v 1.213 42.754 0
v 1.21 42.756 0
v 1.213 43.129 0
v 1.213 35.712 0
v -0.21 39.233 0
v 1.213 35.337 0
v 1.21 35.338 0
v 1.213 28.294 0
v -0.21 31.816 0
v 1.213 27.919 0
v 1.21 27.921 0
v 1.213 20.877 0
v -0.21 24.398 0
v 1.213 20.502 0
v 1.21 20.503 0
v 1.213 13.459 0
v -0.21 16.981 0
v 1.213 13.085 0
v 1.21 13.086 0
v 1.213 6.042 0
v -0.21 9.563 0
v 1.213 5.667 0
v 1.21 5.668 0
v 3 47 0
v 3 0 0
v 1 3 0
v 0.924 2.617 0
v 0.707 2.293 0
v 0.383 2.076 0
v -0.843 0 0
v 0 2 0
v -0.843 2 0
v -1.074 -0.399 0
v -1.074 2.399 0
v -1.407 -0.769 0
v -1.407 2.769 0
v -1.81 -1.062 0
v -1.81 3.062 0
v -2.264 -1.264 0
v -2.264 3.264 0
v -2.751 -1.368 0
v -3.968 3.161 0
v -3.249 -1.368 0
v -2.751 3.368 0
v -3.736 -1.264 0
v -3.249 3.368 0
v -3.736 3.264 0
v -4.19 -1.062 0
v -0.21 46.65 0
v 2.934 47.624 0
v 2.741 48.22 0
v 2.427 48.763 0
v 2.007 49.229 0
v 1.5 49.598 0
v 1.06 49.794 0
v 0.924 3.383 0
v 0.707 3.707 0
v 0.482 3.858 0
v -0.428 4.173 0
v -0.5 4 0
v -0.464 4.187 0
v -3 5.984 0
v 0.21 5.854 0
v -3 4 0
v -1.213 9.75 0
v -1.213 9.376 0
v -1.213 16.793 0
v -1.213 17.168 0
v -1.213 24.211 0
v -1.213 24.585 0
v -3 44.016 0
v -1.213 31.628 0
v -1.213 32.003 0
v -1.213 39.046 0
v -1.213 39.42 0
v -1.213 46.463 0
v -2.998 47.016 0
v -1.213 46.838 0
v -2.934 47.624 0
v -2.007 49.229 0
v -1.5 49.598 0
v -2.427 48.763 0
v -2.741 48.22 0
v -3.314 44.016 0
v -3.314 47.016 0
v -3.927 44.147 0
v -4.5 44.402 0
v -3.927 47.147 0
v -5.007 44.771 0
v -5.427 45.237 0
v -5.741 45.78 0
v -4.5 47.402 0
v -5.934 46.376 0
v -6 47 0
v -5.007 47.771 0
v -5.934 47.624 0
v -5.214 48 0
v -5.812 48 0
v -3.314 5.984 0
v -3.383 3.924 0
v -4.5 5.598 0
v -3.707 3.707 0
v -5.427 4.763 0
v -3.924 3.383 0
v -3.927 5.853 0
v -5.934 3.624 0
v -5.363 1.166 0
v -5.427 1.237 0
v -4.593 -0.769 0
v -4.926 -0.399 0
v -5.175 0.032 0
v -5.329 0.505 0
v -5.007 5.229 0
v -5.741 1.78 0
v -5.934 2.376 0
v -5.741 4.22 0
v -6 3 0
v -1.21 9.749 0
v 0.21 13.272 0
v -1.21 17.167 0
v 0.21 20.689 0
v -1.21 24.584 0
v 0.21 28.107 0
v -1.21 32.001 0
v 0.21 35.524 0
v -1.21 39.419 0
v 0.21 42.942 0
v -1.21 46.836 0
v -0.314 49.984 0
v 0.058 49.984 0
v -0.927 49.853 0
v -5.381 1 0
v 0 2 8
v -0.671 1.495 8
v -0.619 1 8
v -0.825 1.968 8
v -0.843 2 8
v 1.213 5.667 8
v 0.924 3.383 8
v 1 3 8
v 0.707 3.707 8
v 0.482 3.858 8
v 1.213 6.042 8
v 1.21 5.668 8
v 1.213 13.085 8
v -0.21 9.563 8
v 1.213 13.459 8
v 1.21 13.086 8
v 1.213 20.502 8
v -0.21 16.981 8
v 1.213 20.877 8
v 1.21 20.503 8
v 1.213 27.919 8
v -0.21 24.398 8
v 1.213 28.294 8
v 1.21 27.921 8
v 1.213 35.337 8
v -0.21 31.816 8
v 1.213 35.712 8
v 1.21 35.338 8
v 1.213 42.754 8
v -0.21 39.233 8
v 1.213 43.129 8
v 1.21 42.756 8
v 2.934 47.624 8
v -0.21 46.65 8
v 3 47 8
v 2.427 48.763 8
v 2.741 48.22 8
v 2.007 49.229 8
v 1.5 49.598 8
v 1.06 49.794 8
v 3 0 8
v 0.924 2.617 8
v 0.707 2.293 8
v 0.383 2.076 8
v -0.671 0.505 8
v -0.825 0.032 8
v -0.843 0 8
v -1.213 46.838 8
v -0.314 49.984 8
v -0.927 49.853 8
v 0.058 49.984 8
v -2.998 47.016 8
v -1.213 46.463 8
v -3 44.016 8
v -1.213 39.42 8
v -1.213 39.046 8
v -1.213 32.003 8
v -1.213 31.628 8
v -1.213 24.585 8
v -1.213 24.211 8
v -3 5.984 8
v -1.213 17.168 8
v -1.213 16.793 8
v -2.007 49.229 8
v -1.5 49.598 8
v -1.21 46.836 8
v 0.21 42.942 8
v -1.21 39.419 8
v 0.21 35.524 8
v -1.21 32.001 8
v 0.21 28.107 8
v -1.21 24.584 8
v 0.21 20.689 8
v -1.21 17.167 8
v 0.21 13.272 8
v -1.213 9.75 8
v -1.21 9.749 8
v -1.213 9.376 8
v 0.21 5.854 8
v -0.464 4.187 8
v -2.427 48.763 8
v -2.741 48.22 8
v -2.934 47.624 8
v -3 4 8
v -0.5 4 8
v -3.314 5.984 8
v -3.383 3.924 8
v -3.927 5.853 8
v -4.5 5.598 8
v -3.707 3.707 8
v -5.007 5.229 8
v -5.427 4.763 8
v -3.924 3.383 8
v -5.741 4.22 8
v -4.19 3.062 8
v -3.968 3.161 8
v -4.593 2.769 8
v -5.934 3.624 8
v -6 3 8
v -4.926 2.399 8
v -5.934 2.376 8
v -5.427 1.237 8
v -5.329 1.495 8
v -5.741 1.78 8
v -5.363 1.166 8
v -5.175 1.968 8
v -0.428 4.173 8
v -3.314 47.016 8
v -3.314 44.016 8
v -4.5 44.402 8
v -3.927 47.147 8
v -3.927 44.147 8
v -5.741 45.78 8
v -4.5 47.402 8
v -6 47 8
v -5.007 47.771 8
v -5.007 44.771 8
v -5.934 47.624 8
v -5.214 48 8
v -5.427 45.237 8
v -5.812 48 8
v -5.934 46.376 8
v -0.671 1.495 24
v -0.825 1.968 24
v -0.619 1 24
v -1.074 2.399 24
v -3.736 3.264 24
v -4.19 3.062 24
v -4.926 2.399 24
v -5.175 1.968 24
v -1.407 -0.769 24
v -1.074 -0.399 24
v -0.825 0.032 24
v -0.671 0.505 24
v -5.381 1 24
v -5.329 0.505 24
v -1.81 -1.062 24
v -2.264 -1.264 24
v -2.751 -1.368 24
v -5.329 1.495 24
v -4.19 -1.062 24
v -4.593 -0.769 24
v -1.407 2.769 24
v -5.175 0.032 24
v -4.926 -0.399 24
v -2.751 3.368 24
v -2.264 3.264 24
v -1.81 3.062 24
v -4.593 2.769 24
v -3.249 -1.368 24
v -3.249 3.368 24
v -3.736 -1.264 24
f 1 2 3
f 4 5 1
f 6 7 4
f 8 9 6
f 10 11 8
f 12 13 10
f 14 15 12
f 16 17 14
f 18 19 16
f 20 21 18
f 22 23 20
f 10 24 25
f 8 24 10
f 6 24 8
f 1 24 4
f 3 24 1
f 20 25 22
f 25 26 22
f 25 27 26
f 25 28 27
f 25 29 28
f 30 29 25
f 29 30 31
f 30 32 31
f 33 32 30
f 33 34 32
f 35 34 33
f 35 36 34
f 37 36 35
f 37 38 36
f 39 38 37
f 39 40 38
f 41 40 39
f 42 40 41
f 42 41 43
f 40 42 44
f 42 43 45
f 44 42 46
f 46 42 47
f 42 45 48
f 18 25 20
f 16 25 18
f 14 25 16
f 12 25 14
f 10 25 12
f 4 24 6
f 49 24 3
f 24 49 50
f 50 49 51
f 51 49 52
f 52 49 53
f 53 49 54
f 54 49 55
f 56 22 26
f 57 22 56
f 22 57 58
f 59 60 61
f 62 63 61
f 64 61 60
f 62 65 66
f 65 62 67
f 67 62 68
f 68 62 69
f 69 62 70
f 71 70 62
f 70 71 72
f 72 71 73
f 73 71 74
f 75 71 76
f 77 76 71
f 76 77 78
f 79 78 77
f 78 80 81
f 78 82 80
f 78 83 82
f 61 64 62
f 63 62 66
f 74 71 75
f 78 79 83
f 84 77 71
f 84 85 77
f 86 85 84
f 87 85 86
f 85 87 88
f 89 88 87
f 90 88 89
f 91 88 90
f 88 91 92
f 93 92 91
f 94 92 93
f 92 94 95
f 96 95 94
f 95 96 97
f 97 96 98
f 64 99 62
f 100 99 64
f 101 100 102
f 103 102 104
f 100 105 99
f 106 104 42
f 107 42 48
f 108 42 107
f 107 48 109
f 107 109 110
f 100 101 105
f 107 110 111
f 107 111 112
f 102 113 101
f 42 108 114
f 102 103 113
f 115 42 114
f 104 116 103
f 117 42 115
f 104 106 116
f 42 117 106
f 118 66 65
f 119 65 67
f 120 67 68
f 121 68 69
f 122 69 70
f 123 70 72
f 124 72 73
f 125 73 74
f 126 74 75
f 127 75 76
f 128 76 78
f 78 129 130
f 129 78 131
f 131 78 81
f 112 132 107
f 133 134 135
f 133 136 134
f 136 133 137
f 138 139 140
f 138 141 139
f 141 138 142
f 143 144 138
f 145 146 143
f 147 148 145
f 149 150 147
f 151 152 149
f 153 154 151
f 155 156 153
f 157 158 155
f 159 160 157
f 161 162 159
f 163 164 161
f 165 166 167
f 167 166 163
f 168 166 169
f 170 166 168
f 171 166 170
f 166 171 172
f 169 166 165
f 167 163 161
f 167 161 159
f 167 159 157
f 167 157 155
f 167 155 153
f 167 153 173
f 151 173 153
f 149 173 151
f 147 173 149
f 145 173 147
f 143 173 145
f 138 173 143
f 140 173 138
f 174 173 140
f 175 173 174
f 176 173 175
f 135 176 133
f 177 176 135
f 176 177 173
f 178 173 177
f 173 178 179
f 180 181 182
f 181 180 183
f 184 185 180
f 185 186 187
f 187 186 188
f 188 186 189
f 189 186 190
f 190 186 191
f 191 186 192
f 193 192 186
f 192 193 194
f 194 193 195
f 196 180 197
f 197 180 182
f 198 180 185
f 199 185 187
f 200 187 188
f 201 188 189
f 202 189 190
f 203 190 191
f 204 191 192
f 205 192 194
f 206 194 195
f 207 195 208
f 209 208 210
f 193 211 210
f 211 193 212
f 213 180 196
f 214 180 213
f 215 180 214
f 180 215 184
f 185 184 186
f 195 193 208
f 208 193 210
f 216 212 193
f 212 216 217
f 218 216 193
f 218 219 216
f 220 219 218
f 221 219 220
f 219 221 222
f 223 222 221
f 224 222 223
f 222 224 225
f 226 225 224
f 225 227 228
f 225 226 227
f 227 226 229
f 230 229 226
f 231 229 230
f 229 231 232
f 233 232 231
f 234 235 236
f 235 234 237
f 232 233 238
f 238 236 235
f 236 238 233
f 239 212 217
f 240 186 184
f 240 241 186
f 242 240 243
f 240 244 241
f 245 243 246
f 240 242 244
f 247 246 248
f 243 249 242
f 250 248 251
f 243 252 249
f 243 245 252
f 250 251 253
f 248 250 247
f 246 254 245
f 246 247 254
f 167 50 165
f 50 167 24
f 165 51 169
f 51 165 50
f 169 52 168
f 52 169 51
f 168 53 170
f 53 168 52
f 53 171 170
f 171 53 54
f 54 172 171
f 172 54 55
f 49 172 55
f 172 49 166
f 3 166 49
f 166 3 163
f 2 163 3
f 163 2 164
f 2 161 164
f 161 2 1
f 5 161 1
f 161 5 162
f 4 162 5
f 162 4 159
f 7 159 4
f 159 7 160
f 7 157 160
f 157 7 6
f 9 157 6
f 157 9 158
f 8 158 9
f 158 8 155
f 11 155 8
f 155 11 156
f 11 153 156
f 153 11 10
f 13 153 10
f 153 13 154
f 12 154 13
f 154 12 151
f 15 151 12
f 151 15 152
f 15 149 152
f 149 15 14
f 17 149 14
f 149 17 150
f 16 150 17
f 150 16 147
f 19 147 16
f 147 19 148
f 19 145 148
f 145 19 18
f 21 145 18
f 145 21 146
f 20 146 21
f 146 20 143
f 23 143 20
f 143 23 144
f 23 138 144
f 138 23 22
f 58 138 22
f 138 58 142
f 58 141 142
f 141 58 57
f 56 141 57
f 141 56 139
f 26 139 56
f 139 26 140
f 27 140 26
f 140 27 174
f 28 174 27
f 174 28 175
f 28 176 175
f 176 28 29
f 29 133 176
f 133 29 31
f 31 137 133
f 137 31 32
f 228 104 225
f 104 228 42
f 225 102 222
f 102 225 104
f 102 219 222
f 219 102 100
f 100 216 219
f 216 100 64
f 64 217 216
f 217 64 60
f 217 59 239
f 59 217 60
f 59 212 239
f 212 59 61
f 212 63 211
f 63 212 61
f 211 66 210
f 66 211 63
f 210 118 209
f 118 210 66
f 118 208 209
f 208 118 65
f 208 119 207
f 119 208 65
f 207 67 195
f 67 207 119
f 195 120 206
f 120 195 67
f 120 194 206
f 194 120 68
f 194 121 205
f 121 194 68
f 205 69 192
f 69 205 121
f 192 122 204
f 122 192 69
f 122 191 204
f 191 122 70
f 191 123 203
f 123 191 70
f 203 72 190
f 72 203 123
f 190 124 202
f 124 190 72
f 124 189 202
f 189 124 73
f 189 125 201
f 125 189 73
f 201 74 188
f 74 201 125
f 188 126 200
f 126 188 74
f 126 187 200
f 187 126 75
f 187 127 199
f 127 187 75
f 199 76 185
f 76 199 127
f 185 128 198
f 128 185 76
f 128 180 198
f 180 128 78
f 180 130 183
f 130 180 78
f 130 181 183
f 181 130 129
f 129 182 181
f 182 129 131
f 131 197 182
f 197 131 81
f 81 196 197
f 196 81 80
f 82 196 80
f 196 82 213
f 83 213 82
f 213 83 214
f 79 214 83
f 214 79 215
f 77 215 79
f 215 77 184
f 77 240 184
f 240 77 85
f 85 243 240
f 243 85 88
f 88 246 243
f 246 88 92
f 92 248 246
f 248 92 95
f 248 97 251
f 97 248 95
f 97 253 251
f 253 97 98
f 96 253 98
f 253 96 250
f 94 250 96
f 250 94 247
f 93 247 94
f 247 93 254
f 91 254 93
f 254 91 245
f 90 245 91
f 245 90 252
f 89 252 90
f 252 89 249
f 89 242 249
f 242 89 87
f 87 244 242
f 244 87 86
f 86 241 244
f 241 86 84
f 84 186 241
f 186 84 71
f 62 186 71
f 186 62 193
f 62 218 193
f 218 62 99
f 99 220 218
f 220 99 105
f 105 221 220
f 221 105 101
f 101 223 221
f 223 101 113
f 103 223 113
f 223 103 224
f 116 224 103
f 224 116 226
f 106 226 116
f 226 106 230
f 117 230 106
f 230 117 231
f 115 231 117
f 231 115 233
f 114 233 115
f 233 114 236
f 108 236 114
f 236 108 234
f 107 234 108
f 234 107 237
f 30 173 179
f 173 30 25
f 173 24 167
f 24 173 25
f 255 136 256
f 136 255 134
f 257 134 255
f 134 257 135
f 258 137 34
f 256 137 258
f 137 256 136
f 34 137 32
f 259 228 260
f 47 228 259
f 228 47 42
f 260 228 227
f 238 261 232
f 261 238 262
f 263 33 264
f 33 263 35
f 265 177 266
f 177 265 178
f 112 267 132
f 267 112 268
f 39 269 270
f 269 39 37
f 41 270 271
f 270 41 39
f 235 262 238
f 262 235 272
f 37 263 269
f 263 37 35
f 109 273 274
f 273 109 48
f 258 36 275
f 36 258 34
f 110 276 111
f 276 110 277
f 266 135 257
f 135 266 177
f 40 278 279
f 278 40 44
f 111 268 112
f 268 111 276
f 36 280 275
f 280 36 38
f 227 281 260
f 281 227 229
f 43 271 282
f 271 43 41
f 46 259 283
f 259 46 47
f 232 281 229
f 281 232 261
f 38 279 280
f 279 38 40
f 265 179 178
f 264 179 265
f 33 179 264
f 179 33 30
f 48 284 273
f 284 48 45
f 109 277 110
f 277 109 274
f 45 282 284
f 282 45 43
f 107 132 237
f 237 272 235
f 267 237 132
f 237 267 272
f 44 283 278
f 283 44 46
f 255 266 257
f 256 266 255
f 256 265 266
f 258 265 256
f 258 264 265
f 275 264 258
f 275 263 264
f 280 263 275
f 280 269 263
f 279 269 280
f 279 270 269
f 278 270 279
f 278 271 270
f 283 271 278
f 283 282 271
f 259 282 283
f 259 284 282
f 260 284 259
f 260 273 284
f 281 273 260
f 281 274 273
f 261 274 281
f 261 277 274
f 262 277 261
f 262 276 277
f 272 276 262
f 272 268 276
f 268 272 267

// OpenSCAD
//
//  Copyright (C) 05-05-2013 Jasper den Ouden.
//
//  This is free software: you can redistribute it and/or modify
//  it under the terms of the GNU General Public License as published
//  by the Free Software Foundation, either version 3 of the License, or
//  (at your option) any later version.
//

// Clamp profile and application with 5mm pole system.

$fs=0.4;

t=2; //Thicknesses.
l= 50; //Length of clamp.
a=22; //Angle of zigzag.
h = 4*t;

zl = 4*t*cos(a); //Single zigzag length.

al=5;

module clamp_profile()
{   difference()
    {   union()
        {   translate([0,l/2-0.75*t]) square([3*t,l-1.5*t],center=true);
            translate([0,l-1.5*t]) circle(1.5*t);
            translate([1.5*t, 1.5*t]) circle(1.5*t);
            
            translate([1.5*t, l-1.5*t]) difference()
            {   circle(1.5*t);
                translate([0,1.5*t]) circle(1.5*t);
                translate([0,1.5*t]) square(t*[6,2],center=true);
            }
        }
        translate([1.5*t, 1.5*t]) 
        {   circle(t/2);
            translate([-0.75*t,0]) square([1.5*t,t], center=true);
            translate([-1.5*t,0]) circle(t/2);
        }
        translate([0,2*t])
        {   circle(t/4);
            rotate(a) 
            {   translate([0,t/2]) square([t/2,t], center=true);
                
            }
        }
        for( y= [2*t+zl/2 : zl : l] )
        {   translate([0,y]) rotate(-a) 
            {   square([t/2,2*t],center=true);
                for( y=[-t,t] )  translate([0,y]) circle(t/4);
            }
            translate([0,y+zl/2]) rotate(a) square([t/2,2*t],center=true);
        }
    }
}

module clamp()
{
    sf1=1.05;
    linear_extrude(height=h) scale([-1,1]) clamp_profile(); 
    for( x=[-1.5*t:2*al:t]) translate([x,t/2]) cylinder(r=al/(2*sf1), h= 2*t+4*al);
}

clamp();
